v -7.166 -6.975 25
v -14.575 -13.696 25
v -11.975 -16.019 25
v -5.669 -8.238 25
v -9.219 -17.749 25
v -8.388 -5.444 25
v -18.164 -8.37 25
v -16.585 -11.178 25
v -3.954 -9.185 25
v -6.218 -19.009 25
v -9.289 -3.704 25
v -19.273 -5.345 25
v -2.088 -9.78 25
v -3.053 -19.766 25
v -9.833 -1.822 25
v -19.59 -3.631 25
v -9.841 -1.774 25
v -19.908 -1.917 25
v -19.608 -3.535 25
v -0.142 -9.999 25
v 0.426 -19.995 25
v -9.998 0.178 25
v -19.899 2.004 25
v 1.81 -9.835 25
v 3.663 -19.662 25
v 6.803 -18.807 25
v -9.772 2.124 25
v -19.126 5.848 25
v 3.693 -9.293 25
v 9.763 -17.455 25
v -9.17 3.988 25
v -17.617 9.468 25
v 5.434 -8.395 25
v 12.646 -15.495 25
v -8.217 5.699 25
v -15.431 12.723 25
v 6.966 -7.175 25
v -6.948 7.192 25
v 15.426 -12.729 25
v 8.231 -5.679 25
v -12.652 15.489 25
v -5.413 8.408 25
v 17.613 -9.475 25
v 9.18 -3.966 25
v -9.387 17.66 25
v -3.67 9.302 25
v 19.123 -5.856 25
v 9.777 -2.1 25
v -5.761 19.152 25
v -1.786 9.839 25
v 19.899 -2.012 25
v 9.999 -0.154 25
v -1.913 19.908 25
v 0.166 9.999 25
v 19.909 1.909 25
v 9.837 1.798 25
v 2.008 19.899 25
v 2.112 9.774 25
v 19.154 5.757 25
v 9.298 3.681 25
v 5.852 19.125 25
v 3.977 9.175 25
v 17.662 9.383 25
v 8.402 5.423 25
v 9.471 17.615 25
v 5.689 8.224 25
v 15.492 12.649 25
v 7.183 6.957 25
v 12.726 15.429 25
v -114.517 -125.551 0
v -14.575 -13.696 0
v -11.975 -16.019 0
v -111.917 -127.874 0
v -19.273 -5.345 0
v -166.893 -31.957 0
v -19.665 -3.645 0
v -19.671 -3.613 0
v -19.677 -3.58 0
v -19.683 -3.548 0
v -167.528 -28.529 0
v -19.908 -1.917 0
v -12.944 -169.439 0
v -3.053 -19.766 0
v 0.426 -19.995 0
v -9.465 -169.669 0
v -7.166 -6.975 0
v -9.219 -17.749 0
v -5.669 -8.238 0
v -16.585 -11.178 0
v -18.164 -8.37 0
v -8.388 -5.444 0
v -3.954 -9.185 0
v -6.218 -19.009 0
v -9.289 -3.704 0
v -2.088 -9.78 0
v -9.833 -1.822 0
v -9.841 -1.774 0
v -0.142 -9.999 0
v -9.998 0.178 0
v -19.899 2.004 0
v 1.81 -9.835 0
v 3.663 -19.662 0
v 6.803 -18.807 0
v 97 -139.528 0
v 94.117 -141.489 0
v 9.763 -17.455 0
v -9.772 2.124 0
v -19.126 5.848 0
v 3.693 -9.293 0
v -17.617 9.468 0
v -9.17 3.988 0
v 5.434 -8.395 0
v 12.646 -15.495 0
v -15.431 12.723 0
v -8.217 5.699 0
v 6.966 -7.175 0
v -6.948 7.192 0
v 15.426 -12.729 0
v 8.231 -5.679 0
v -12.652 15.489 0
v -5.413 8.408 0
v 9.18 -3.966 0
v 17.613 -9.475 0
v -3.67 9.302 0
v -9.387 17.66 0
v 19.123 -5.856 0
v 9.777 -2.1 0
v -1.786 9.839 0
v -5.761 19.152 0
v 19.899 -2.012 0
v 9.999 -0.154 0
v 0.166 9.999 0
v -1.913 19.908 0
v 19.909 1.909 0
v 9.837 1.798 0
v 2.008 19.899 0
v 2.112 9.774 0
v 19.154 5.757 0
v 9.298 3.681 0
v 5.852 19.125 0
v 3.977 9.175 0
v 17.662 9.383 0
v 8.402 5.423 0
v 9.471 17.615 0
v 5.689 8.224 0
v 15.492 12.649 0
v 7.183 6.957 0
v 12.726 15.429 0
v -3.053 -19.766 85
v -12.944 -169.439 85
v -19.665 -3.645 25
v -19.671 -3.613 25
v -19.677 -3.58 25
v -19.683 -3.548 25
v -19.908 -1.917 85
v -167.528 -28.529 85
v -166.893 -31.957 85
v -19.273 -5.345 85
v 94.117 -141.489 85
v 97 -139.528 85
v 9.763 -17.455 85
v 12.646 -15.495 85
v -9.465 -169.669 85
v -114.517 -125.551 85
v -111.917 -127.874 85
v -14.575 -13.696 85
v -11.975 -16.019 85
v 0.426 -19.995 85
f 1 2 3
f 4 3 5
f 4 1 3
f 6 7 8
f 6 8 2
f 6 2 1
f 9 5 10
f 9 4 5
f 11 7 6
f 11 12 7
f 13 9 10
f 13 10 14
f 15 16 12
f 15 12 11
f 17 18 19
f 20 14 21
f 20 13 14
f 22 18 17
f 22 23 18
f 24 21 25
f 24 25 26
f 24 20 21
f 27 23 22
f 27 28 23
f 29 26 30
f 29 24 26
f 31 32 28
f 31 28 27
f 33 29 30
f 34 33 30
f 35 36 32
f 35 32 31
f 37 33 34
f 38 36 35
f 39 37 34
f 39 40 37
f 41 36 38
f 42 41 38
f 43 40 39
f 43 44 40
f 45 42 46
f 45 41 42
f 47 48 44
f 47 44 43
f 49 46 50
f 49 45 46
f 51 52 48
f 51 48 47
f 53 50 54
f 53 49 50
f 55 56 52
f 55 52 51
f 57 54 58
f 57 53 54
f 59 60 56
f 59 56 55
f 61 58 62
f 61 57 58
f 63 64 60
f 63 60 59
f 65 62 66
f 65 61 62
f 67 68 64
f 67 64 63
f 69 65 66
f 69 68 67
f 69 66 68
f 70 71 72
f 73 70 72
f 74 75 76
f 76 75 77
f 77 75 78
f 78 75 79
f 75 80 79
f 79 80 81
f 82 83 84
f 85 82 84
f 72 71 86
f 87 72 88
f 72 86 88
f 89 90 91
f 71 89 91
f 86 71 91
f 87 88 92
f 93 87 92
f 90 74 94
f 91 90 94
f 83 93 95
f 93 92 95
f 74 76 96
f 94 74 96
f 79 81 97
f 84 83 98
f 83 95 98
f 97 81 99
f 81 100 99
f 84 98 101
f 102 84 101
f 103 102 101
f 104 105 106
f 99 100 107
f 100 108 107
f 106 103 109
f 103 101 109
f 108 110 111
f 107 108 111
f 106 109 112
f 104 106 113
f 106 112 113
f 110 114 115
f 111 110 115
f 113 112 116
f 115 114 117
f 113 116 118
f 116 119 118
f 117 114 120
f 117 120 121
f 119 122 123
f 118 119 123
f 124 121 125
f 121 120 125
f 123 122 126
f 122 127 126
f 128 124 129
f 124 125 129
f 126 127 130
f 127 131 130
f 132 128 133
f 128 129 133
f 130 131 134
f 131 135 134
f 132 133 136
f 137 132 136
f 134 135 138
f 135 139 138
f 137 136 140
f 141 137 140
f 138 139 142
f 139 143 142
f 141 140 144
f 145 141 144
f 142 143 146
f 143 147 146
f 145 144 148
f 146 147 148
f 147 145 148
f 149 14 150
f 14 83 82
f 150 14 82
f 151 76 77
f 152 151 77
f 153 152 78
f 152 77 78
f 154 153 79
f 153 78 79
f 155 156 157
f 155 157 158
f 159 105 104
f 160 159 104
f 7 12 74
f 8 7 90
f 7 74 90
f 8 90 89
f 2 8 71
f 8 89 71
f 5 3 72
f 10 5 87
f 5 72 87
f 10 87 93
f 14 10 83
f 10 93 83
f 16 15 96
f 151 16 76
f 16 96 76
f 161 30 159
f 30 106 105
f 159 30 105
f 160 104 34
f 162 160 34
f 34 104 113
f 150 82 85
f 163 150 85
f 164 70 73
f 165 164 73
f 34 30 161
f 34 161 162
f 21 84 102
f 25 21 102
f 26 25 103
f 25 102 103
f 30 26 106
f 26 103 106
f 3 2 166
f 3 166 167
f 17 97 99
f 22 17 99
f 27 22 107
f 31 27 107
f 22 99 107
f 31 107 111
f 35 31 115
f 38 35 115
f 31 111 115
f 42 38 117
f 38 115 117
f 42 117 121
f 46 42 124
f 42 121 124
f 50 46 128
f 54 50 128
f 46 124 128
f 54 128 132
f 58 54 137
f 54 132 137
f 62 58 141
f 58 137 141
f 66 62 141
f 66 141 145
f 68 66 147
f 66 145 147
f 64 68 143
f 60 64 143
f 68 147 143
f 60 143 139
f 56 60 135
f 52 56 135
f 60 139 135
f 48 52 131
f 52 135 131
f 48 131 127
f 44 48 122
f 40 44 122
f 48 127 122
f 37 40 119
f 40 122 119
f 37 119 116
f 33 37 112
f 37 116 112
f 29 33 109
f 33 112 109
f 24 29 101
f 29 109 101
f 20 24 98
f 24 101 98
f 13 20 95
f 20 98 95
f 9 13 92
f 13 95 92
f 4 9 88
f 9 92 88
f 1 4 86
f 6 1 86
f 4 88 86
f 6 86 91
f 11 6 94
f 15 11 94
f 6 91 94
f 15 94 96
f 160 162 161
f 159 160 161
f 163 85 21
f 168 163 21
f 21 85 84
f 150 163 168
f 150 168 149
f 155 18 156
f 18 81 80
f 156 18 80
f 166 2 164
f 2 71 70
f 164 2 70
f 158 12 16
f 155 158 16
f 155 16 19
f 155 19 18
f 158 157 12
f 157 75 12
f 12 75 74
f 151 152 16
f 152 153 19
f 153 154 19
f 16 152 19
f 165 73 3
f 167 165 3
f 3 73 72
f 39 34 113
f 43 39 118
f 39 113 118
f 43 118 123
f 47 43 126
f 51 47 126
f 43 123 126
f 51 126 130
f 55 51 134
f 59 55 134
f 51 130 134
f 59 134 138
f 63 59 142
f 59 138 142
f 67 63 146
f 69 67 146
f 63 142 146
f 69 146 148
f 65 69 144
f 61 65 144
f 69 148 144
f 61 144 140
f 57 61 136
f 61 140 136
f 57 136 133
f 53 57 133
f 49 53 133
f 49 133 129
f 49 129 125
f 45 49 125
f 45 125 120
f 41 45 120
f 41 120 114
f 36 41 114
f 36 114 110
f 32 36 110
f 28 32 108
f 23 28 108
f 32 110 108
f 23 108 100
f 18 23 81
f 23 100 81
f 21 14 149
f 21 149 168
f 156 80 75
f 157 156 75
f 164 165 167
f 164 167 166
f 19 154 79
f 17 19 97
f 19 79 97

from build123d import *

# Parameters (mm, degrees)
BOSS_EXTRUDE2_DEPTH = 25
BOSS_EXTRUDE3_DEPTH = 60


with BuildPart() as part:
    # Sketch1 → Boss-Extrude2 (new body)
    with BuildSketch(Plane.XY):
        with BuildLine():
            ThreePointArc((-19.272609064, -5.344767522), (-17.431181917, -9.805809349), (-14.574748022, -13.695865072))
            Line((-14.574748022, -13.695865072), (-114.51684862, -125.551023774))
            Line((-114.51684862, -125.551023774), (-111.917163437, -127.873831243))
            Line((-111.917163437, -127.873831243), (-11.975062839, -16.018672542))
            ThreePointArc((-11.975062839, -16.018672542), (-7.744084669, -18.43987941), (-3.053041676, -19.765599827))
            Line((-3.053041676, -19.765599827), (-12.943579656, -169.439168831))
            Line((-12.943579656, -169.439168831), (-9.464936702, -169.66904008))
            Line((-9.464936702, -169.66904008), (0.425601277, -19.995471076))
            ThreePointArc((0.425601277, -19.995471076), (5.250301367, -19.298557862), (9.763088678, -17.455145358))
            Line((9.763088678, -17.455145358), (94.117488701, -141.488750468))
            Line((94.117488701, -141.488750468), (97.000219629, -139.528225031))
            Line((97.000219629, -139.528225031), (12.645819606, -15.494619921))
            ThreePointArc((12.645819606, -15.494619921), (7.698899748, 18.45879039), (-19.907923967, -1.91691505))
            Line((-19.907923967, -1.91691505), (-167.528286005, -28.529481853))
            Line((-167.528286005, -28.529481853), (-166.892971102, -31.957334324))
            Line((-166.892971102, -31.957334324), (-19.272609064, -5.344767522))
        make_face()
        with BuildLine():
            Line((-19.682714938, -3.54834224), (-9.841357469, -1.77417112))
            ThreePointArc((-9.841357469, -1.77417112), (9.836982775, 1.798268581), (-9.832549076, -1.822355255))
            Line((-9.832549076, -1.822355255), (-19.665098151, -3.64471051))
            ThreePointArc((-19.665098151, -3.64471051), (-19.67396555, -3.596537162), (-19.682714938, -3.54834224))
        make_face(mode=Mode.SUBTRACT)
    extrude(amount=BOSS_EXTRUDE2_DEPTH)

    # Sketch2 → Boss-Extrude3 (add)
    with BuildSketch(Plane.XY.offset(25)):
        Polygon((-167.528286005, -28.529481853), (-166.892971102, -31.957334324), (-19.272609064, -5.344767522), (-19.907923967, -1.91691505), align=None)
        Polygon((-14.574748022, -13.695865072), (-11.975062839, -16.018672542), (-111.917163437, -127.873831243), (-114.51684862, -125.551023774), align=None)
        Polygon((-3.053041676, -19.765599827), (0.425601277, -19.995471076), (-9.464936702, -169.66904008), (-12.943579656, -169.439168831), align=None)
        Polygon((9.763088678, -17.455145358), (12.645819606, -15.494619921), (97.000219629, -139.528225031), (94.117488701, -141.488750468), align=None)
    extrude(amount=BOSS_EXTRUDE3_DEPTH)


solid = part.part
